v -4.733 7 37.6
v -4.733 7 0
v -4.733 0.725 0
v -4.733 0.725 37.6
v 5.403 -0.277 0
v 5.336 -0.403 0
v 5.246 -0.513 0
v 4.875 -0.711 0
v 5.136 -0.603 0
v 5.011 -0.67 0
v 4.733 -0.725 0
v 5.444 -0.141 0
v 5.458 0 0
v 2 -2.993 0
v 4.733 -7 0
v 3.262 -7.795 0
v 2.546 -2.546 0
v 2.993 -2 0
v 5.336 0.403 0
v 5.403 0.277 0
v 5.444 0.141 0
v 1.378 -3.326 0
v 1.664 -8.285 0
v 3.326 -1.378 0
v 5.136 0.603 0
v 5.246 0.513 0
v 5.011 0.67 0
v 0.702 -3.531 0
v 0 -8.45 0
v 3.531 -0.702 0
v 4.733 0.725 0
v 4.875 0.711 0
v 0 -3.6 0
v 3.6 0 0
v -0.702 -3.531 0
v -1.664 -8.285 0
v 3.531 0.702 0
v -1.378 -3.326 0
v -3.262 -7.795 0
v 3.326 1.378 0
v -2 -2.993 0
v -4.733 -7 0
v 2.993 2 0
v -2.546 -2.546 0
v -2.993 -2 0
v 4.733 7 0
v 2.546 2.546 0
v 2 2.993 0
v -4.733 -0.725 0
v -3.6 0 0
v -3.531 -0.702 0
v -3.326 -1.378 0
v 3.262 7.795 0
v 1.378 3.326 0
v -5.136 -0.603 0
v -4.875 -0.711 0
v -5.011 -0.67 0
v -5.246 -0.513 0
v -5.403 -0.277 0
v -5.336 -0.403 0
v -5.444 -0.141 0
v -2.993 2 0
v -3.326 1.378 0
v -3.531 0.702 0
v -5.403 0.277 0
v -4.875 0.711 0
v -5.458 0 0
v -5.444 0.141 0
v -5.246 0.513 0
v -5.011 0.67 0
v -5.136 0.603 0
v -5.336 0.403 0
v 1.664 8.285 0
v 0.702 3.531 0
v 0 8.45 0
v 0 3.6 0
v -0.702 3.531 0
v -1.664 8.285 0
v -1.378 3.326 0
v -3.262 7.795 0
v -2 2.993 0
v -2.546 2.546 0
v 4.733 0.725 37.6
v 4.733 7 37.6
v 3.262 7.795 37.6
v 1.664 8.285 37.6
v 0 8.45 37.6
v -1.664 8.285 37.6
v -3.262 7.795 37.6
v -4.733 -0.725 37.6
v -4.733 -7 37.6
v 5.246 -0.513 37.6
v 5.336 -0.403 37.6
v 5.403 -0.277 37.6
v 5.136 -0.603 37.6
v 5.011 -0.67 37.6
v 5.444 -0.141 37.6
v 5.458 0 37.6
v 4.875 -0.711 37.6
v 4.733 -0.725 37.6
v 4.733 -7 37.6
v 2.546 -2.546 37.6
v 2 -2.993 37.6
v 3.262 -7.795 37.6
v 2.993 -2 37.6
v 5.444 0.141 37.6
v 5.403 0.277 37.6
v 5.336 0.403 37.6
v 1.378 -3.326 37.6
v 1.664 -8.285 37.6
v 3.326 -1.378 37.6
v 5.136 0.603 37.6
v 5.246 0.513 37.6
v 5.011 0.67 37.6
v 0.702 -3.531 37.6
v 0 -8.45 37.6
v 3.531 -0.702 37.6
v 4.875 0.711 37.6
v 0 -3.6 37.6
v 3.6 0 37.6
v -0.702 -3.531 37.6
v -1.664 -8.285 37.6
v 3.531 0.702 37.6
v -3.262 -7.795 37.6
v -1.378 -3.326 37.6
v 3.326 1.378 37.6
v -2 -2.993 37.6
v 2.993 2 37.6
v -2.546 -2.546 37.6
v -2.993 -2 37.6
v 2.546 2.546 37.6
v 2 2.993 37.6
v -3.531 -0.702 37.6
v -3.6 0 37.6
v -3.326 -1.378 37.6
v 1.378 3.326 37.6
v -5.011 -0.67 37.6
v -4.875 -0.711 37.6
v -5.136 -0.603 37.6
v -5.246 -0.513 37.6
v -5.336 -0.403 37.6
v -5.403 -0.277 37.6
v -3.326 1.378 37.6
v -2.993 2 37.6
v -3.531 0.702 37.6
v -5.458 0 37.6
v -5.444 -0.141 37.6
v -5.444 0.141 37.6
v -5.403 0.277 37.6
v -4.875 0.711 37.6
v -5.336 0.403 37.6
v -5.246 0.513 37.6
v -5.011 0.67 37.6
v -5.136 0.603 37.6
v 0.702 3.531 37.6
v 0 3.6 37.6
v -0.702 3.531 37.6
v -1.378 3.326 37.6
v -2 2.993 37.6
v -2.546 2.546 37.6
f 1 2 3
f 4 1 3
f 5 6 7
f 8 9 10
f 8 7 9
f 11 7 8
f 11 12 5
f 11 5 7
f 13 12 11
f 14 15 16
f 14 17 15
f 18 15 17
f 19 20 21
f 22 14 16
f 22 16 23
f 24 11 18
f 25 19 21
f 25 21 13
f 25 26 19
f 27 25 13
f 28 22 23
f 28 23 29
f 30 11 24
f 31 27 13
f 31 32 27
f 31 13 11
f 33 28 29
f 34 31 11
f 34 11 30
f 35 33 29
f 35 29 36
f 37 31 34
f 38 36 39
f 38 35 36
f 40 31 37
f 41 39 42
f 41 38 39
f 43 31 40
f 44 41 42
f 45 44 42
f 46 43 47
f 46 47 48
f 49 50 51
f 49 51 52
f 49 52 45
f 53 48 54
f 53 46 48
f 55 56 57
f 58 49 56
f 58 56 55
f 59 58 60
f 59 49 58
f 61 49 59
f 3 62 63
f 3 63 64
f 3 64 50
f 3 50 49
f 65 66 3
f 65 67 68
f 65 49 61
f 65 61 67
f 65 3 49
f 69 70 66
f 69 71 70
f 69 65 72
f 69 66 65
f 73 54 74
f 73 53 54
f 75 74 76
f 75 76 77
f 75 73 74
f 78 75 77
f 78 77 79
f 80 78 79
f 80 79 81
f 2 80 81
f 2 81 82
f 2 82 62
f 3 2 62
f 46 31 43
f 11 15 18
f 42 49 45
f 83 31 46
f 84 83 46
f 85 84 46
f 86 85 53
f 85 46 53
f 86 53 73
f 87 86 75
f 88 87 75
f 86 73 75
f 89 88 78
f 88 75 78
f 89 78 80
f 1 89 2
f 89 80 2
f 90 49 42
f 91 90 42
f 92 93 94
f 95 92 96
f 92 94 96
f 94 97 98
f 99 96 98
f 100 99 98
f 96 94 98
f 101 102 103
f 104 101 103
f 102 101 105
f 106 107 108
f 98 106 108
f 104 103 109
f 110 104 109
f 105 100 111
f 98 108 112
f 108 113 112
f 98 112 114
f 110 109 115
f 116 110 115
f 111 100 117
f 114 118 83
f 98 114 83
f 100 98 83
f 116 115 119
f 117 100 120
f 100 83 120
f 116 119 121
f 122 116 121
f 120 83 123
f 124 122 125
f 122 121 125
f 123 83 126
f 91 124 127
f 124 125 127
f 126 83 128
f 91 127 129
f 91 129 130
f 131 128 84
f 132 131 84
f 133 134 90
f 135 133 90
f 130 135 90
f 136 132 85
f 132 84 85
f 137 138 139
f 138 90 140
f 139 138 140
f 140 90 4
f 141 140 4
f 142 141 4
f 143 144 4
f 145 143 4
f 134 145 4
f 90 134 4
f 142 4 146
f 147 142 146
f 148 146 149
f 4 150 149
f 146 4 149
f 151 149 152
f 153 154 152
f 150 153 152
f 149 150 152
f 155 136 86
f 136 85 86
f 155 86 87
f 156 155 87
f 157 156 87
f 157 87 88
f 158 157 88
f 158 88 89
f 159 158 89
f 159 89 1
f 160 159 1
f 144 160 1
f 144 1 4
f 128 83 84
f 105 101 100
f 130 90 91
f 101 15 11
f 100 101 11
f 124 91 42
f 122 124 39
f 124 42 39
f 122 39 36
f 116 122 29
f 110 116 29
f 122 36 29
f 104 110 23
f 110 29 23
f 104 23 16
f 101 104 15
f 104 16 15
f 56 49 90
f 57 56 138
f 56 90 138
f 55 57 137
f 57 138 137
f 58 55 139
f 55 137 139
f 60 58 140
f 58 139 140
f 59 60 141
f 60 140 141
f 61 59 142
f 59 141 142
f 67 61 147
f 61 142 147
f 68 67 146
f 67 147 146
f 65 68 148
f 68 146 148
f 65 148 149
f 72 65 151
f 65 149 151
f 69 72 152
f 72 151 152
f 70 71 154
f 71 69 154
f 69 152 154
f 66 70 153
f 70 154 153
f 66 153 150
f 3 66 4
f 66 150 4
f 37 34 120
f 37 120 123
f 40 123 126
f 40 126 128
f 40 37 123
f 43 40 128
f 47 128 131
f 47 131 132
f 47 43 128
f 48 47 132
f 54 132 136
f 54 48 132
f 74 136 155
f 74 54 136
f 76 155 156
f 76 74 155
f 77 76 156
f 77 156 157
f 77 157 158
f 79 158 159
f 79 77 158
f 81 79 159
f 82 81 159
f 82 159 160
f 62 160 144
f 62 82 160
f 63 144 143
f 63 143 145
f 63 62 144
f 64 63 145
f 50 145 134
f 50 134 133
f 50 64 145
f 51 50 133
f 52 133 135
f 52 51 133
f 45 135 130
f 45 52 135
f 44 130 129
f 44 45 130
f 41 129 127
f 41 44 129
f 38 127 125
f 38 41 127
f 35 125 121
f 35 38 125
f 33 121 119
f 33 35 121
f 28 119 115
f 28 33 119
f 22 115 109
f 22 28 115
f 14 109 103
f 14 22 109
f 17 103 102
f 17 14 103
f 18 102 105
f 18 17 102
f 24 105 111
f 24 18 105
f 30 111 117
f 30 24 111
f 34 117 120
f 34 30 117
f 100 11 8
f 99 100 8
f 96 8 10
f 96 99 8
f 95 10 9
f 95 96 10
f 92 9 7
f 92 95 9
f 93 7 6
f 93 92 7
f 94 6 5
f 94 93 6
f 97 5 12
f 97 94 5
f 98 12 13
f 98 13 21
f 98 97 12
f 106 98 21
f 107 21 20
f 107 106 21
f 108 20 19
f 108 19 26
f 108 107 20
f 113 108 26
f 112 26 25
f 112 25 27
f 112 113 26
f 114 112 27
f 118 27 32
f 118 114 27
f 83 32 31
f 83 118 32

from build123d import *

# Parameters (mm, degrees)
F0_R     = 3.6
F1_DEPTH = 37.6
F2_R     = 0.725
F3_DEPTH = 37.6


# Not quite as in the source:
# - a pattern or mirror of a feature is missing from the dataset's text; its kind, count and spacing are read off the source's solid


with BuildPart() as f1:
    # F0 (on Top) → F1 (new body)
    with BuildSketch(Plane.XY):
        with BuildLine():
            Line((4.7331279298, -7), (4.7331279298, 7))
            ThreePointArc((4.7331279298, 7), (0, 8.45), (-4.7331279298, 7))
            Line((-4.7331279298, 7), (-4.7331279298, -7))
            ThreePointArc((-4.7331279298, -7), (0, -8.45), (4.7331279298, -7))
        make_face()
        Circle(F0_R, mode=Mode.SUBTRACT)
    extrude(amount=F1_DEPTH)

    # F2 (on face) → F3 (join)
    with BuildSketch(Plane.XY.offset(37.6)):
        with Locations((4.7331279298, 0)):
            Circle(F2_R)
    f3 = extrude(amount=-F3_DEPTH)

    # F3_copies: F3 across plane
    add(f3.mirror(Plane(origin=(0, 0, 0), x_dir=(0, 0, -1), z_dir=(-1, 0, 0))))


solid = f1.part
